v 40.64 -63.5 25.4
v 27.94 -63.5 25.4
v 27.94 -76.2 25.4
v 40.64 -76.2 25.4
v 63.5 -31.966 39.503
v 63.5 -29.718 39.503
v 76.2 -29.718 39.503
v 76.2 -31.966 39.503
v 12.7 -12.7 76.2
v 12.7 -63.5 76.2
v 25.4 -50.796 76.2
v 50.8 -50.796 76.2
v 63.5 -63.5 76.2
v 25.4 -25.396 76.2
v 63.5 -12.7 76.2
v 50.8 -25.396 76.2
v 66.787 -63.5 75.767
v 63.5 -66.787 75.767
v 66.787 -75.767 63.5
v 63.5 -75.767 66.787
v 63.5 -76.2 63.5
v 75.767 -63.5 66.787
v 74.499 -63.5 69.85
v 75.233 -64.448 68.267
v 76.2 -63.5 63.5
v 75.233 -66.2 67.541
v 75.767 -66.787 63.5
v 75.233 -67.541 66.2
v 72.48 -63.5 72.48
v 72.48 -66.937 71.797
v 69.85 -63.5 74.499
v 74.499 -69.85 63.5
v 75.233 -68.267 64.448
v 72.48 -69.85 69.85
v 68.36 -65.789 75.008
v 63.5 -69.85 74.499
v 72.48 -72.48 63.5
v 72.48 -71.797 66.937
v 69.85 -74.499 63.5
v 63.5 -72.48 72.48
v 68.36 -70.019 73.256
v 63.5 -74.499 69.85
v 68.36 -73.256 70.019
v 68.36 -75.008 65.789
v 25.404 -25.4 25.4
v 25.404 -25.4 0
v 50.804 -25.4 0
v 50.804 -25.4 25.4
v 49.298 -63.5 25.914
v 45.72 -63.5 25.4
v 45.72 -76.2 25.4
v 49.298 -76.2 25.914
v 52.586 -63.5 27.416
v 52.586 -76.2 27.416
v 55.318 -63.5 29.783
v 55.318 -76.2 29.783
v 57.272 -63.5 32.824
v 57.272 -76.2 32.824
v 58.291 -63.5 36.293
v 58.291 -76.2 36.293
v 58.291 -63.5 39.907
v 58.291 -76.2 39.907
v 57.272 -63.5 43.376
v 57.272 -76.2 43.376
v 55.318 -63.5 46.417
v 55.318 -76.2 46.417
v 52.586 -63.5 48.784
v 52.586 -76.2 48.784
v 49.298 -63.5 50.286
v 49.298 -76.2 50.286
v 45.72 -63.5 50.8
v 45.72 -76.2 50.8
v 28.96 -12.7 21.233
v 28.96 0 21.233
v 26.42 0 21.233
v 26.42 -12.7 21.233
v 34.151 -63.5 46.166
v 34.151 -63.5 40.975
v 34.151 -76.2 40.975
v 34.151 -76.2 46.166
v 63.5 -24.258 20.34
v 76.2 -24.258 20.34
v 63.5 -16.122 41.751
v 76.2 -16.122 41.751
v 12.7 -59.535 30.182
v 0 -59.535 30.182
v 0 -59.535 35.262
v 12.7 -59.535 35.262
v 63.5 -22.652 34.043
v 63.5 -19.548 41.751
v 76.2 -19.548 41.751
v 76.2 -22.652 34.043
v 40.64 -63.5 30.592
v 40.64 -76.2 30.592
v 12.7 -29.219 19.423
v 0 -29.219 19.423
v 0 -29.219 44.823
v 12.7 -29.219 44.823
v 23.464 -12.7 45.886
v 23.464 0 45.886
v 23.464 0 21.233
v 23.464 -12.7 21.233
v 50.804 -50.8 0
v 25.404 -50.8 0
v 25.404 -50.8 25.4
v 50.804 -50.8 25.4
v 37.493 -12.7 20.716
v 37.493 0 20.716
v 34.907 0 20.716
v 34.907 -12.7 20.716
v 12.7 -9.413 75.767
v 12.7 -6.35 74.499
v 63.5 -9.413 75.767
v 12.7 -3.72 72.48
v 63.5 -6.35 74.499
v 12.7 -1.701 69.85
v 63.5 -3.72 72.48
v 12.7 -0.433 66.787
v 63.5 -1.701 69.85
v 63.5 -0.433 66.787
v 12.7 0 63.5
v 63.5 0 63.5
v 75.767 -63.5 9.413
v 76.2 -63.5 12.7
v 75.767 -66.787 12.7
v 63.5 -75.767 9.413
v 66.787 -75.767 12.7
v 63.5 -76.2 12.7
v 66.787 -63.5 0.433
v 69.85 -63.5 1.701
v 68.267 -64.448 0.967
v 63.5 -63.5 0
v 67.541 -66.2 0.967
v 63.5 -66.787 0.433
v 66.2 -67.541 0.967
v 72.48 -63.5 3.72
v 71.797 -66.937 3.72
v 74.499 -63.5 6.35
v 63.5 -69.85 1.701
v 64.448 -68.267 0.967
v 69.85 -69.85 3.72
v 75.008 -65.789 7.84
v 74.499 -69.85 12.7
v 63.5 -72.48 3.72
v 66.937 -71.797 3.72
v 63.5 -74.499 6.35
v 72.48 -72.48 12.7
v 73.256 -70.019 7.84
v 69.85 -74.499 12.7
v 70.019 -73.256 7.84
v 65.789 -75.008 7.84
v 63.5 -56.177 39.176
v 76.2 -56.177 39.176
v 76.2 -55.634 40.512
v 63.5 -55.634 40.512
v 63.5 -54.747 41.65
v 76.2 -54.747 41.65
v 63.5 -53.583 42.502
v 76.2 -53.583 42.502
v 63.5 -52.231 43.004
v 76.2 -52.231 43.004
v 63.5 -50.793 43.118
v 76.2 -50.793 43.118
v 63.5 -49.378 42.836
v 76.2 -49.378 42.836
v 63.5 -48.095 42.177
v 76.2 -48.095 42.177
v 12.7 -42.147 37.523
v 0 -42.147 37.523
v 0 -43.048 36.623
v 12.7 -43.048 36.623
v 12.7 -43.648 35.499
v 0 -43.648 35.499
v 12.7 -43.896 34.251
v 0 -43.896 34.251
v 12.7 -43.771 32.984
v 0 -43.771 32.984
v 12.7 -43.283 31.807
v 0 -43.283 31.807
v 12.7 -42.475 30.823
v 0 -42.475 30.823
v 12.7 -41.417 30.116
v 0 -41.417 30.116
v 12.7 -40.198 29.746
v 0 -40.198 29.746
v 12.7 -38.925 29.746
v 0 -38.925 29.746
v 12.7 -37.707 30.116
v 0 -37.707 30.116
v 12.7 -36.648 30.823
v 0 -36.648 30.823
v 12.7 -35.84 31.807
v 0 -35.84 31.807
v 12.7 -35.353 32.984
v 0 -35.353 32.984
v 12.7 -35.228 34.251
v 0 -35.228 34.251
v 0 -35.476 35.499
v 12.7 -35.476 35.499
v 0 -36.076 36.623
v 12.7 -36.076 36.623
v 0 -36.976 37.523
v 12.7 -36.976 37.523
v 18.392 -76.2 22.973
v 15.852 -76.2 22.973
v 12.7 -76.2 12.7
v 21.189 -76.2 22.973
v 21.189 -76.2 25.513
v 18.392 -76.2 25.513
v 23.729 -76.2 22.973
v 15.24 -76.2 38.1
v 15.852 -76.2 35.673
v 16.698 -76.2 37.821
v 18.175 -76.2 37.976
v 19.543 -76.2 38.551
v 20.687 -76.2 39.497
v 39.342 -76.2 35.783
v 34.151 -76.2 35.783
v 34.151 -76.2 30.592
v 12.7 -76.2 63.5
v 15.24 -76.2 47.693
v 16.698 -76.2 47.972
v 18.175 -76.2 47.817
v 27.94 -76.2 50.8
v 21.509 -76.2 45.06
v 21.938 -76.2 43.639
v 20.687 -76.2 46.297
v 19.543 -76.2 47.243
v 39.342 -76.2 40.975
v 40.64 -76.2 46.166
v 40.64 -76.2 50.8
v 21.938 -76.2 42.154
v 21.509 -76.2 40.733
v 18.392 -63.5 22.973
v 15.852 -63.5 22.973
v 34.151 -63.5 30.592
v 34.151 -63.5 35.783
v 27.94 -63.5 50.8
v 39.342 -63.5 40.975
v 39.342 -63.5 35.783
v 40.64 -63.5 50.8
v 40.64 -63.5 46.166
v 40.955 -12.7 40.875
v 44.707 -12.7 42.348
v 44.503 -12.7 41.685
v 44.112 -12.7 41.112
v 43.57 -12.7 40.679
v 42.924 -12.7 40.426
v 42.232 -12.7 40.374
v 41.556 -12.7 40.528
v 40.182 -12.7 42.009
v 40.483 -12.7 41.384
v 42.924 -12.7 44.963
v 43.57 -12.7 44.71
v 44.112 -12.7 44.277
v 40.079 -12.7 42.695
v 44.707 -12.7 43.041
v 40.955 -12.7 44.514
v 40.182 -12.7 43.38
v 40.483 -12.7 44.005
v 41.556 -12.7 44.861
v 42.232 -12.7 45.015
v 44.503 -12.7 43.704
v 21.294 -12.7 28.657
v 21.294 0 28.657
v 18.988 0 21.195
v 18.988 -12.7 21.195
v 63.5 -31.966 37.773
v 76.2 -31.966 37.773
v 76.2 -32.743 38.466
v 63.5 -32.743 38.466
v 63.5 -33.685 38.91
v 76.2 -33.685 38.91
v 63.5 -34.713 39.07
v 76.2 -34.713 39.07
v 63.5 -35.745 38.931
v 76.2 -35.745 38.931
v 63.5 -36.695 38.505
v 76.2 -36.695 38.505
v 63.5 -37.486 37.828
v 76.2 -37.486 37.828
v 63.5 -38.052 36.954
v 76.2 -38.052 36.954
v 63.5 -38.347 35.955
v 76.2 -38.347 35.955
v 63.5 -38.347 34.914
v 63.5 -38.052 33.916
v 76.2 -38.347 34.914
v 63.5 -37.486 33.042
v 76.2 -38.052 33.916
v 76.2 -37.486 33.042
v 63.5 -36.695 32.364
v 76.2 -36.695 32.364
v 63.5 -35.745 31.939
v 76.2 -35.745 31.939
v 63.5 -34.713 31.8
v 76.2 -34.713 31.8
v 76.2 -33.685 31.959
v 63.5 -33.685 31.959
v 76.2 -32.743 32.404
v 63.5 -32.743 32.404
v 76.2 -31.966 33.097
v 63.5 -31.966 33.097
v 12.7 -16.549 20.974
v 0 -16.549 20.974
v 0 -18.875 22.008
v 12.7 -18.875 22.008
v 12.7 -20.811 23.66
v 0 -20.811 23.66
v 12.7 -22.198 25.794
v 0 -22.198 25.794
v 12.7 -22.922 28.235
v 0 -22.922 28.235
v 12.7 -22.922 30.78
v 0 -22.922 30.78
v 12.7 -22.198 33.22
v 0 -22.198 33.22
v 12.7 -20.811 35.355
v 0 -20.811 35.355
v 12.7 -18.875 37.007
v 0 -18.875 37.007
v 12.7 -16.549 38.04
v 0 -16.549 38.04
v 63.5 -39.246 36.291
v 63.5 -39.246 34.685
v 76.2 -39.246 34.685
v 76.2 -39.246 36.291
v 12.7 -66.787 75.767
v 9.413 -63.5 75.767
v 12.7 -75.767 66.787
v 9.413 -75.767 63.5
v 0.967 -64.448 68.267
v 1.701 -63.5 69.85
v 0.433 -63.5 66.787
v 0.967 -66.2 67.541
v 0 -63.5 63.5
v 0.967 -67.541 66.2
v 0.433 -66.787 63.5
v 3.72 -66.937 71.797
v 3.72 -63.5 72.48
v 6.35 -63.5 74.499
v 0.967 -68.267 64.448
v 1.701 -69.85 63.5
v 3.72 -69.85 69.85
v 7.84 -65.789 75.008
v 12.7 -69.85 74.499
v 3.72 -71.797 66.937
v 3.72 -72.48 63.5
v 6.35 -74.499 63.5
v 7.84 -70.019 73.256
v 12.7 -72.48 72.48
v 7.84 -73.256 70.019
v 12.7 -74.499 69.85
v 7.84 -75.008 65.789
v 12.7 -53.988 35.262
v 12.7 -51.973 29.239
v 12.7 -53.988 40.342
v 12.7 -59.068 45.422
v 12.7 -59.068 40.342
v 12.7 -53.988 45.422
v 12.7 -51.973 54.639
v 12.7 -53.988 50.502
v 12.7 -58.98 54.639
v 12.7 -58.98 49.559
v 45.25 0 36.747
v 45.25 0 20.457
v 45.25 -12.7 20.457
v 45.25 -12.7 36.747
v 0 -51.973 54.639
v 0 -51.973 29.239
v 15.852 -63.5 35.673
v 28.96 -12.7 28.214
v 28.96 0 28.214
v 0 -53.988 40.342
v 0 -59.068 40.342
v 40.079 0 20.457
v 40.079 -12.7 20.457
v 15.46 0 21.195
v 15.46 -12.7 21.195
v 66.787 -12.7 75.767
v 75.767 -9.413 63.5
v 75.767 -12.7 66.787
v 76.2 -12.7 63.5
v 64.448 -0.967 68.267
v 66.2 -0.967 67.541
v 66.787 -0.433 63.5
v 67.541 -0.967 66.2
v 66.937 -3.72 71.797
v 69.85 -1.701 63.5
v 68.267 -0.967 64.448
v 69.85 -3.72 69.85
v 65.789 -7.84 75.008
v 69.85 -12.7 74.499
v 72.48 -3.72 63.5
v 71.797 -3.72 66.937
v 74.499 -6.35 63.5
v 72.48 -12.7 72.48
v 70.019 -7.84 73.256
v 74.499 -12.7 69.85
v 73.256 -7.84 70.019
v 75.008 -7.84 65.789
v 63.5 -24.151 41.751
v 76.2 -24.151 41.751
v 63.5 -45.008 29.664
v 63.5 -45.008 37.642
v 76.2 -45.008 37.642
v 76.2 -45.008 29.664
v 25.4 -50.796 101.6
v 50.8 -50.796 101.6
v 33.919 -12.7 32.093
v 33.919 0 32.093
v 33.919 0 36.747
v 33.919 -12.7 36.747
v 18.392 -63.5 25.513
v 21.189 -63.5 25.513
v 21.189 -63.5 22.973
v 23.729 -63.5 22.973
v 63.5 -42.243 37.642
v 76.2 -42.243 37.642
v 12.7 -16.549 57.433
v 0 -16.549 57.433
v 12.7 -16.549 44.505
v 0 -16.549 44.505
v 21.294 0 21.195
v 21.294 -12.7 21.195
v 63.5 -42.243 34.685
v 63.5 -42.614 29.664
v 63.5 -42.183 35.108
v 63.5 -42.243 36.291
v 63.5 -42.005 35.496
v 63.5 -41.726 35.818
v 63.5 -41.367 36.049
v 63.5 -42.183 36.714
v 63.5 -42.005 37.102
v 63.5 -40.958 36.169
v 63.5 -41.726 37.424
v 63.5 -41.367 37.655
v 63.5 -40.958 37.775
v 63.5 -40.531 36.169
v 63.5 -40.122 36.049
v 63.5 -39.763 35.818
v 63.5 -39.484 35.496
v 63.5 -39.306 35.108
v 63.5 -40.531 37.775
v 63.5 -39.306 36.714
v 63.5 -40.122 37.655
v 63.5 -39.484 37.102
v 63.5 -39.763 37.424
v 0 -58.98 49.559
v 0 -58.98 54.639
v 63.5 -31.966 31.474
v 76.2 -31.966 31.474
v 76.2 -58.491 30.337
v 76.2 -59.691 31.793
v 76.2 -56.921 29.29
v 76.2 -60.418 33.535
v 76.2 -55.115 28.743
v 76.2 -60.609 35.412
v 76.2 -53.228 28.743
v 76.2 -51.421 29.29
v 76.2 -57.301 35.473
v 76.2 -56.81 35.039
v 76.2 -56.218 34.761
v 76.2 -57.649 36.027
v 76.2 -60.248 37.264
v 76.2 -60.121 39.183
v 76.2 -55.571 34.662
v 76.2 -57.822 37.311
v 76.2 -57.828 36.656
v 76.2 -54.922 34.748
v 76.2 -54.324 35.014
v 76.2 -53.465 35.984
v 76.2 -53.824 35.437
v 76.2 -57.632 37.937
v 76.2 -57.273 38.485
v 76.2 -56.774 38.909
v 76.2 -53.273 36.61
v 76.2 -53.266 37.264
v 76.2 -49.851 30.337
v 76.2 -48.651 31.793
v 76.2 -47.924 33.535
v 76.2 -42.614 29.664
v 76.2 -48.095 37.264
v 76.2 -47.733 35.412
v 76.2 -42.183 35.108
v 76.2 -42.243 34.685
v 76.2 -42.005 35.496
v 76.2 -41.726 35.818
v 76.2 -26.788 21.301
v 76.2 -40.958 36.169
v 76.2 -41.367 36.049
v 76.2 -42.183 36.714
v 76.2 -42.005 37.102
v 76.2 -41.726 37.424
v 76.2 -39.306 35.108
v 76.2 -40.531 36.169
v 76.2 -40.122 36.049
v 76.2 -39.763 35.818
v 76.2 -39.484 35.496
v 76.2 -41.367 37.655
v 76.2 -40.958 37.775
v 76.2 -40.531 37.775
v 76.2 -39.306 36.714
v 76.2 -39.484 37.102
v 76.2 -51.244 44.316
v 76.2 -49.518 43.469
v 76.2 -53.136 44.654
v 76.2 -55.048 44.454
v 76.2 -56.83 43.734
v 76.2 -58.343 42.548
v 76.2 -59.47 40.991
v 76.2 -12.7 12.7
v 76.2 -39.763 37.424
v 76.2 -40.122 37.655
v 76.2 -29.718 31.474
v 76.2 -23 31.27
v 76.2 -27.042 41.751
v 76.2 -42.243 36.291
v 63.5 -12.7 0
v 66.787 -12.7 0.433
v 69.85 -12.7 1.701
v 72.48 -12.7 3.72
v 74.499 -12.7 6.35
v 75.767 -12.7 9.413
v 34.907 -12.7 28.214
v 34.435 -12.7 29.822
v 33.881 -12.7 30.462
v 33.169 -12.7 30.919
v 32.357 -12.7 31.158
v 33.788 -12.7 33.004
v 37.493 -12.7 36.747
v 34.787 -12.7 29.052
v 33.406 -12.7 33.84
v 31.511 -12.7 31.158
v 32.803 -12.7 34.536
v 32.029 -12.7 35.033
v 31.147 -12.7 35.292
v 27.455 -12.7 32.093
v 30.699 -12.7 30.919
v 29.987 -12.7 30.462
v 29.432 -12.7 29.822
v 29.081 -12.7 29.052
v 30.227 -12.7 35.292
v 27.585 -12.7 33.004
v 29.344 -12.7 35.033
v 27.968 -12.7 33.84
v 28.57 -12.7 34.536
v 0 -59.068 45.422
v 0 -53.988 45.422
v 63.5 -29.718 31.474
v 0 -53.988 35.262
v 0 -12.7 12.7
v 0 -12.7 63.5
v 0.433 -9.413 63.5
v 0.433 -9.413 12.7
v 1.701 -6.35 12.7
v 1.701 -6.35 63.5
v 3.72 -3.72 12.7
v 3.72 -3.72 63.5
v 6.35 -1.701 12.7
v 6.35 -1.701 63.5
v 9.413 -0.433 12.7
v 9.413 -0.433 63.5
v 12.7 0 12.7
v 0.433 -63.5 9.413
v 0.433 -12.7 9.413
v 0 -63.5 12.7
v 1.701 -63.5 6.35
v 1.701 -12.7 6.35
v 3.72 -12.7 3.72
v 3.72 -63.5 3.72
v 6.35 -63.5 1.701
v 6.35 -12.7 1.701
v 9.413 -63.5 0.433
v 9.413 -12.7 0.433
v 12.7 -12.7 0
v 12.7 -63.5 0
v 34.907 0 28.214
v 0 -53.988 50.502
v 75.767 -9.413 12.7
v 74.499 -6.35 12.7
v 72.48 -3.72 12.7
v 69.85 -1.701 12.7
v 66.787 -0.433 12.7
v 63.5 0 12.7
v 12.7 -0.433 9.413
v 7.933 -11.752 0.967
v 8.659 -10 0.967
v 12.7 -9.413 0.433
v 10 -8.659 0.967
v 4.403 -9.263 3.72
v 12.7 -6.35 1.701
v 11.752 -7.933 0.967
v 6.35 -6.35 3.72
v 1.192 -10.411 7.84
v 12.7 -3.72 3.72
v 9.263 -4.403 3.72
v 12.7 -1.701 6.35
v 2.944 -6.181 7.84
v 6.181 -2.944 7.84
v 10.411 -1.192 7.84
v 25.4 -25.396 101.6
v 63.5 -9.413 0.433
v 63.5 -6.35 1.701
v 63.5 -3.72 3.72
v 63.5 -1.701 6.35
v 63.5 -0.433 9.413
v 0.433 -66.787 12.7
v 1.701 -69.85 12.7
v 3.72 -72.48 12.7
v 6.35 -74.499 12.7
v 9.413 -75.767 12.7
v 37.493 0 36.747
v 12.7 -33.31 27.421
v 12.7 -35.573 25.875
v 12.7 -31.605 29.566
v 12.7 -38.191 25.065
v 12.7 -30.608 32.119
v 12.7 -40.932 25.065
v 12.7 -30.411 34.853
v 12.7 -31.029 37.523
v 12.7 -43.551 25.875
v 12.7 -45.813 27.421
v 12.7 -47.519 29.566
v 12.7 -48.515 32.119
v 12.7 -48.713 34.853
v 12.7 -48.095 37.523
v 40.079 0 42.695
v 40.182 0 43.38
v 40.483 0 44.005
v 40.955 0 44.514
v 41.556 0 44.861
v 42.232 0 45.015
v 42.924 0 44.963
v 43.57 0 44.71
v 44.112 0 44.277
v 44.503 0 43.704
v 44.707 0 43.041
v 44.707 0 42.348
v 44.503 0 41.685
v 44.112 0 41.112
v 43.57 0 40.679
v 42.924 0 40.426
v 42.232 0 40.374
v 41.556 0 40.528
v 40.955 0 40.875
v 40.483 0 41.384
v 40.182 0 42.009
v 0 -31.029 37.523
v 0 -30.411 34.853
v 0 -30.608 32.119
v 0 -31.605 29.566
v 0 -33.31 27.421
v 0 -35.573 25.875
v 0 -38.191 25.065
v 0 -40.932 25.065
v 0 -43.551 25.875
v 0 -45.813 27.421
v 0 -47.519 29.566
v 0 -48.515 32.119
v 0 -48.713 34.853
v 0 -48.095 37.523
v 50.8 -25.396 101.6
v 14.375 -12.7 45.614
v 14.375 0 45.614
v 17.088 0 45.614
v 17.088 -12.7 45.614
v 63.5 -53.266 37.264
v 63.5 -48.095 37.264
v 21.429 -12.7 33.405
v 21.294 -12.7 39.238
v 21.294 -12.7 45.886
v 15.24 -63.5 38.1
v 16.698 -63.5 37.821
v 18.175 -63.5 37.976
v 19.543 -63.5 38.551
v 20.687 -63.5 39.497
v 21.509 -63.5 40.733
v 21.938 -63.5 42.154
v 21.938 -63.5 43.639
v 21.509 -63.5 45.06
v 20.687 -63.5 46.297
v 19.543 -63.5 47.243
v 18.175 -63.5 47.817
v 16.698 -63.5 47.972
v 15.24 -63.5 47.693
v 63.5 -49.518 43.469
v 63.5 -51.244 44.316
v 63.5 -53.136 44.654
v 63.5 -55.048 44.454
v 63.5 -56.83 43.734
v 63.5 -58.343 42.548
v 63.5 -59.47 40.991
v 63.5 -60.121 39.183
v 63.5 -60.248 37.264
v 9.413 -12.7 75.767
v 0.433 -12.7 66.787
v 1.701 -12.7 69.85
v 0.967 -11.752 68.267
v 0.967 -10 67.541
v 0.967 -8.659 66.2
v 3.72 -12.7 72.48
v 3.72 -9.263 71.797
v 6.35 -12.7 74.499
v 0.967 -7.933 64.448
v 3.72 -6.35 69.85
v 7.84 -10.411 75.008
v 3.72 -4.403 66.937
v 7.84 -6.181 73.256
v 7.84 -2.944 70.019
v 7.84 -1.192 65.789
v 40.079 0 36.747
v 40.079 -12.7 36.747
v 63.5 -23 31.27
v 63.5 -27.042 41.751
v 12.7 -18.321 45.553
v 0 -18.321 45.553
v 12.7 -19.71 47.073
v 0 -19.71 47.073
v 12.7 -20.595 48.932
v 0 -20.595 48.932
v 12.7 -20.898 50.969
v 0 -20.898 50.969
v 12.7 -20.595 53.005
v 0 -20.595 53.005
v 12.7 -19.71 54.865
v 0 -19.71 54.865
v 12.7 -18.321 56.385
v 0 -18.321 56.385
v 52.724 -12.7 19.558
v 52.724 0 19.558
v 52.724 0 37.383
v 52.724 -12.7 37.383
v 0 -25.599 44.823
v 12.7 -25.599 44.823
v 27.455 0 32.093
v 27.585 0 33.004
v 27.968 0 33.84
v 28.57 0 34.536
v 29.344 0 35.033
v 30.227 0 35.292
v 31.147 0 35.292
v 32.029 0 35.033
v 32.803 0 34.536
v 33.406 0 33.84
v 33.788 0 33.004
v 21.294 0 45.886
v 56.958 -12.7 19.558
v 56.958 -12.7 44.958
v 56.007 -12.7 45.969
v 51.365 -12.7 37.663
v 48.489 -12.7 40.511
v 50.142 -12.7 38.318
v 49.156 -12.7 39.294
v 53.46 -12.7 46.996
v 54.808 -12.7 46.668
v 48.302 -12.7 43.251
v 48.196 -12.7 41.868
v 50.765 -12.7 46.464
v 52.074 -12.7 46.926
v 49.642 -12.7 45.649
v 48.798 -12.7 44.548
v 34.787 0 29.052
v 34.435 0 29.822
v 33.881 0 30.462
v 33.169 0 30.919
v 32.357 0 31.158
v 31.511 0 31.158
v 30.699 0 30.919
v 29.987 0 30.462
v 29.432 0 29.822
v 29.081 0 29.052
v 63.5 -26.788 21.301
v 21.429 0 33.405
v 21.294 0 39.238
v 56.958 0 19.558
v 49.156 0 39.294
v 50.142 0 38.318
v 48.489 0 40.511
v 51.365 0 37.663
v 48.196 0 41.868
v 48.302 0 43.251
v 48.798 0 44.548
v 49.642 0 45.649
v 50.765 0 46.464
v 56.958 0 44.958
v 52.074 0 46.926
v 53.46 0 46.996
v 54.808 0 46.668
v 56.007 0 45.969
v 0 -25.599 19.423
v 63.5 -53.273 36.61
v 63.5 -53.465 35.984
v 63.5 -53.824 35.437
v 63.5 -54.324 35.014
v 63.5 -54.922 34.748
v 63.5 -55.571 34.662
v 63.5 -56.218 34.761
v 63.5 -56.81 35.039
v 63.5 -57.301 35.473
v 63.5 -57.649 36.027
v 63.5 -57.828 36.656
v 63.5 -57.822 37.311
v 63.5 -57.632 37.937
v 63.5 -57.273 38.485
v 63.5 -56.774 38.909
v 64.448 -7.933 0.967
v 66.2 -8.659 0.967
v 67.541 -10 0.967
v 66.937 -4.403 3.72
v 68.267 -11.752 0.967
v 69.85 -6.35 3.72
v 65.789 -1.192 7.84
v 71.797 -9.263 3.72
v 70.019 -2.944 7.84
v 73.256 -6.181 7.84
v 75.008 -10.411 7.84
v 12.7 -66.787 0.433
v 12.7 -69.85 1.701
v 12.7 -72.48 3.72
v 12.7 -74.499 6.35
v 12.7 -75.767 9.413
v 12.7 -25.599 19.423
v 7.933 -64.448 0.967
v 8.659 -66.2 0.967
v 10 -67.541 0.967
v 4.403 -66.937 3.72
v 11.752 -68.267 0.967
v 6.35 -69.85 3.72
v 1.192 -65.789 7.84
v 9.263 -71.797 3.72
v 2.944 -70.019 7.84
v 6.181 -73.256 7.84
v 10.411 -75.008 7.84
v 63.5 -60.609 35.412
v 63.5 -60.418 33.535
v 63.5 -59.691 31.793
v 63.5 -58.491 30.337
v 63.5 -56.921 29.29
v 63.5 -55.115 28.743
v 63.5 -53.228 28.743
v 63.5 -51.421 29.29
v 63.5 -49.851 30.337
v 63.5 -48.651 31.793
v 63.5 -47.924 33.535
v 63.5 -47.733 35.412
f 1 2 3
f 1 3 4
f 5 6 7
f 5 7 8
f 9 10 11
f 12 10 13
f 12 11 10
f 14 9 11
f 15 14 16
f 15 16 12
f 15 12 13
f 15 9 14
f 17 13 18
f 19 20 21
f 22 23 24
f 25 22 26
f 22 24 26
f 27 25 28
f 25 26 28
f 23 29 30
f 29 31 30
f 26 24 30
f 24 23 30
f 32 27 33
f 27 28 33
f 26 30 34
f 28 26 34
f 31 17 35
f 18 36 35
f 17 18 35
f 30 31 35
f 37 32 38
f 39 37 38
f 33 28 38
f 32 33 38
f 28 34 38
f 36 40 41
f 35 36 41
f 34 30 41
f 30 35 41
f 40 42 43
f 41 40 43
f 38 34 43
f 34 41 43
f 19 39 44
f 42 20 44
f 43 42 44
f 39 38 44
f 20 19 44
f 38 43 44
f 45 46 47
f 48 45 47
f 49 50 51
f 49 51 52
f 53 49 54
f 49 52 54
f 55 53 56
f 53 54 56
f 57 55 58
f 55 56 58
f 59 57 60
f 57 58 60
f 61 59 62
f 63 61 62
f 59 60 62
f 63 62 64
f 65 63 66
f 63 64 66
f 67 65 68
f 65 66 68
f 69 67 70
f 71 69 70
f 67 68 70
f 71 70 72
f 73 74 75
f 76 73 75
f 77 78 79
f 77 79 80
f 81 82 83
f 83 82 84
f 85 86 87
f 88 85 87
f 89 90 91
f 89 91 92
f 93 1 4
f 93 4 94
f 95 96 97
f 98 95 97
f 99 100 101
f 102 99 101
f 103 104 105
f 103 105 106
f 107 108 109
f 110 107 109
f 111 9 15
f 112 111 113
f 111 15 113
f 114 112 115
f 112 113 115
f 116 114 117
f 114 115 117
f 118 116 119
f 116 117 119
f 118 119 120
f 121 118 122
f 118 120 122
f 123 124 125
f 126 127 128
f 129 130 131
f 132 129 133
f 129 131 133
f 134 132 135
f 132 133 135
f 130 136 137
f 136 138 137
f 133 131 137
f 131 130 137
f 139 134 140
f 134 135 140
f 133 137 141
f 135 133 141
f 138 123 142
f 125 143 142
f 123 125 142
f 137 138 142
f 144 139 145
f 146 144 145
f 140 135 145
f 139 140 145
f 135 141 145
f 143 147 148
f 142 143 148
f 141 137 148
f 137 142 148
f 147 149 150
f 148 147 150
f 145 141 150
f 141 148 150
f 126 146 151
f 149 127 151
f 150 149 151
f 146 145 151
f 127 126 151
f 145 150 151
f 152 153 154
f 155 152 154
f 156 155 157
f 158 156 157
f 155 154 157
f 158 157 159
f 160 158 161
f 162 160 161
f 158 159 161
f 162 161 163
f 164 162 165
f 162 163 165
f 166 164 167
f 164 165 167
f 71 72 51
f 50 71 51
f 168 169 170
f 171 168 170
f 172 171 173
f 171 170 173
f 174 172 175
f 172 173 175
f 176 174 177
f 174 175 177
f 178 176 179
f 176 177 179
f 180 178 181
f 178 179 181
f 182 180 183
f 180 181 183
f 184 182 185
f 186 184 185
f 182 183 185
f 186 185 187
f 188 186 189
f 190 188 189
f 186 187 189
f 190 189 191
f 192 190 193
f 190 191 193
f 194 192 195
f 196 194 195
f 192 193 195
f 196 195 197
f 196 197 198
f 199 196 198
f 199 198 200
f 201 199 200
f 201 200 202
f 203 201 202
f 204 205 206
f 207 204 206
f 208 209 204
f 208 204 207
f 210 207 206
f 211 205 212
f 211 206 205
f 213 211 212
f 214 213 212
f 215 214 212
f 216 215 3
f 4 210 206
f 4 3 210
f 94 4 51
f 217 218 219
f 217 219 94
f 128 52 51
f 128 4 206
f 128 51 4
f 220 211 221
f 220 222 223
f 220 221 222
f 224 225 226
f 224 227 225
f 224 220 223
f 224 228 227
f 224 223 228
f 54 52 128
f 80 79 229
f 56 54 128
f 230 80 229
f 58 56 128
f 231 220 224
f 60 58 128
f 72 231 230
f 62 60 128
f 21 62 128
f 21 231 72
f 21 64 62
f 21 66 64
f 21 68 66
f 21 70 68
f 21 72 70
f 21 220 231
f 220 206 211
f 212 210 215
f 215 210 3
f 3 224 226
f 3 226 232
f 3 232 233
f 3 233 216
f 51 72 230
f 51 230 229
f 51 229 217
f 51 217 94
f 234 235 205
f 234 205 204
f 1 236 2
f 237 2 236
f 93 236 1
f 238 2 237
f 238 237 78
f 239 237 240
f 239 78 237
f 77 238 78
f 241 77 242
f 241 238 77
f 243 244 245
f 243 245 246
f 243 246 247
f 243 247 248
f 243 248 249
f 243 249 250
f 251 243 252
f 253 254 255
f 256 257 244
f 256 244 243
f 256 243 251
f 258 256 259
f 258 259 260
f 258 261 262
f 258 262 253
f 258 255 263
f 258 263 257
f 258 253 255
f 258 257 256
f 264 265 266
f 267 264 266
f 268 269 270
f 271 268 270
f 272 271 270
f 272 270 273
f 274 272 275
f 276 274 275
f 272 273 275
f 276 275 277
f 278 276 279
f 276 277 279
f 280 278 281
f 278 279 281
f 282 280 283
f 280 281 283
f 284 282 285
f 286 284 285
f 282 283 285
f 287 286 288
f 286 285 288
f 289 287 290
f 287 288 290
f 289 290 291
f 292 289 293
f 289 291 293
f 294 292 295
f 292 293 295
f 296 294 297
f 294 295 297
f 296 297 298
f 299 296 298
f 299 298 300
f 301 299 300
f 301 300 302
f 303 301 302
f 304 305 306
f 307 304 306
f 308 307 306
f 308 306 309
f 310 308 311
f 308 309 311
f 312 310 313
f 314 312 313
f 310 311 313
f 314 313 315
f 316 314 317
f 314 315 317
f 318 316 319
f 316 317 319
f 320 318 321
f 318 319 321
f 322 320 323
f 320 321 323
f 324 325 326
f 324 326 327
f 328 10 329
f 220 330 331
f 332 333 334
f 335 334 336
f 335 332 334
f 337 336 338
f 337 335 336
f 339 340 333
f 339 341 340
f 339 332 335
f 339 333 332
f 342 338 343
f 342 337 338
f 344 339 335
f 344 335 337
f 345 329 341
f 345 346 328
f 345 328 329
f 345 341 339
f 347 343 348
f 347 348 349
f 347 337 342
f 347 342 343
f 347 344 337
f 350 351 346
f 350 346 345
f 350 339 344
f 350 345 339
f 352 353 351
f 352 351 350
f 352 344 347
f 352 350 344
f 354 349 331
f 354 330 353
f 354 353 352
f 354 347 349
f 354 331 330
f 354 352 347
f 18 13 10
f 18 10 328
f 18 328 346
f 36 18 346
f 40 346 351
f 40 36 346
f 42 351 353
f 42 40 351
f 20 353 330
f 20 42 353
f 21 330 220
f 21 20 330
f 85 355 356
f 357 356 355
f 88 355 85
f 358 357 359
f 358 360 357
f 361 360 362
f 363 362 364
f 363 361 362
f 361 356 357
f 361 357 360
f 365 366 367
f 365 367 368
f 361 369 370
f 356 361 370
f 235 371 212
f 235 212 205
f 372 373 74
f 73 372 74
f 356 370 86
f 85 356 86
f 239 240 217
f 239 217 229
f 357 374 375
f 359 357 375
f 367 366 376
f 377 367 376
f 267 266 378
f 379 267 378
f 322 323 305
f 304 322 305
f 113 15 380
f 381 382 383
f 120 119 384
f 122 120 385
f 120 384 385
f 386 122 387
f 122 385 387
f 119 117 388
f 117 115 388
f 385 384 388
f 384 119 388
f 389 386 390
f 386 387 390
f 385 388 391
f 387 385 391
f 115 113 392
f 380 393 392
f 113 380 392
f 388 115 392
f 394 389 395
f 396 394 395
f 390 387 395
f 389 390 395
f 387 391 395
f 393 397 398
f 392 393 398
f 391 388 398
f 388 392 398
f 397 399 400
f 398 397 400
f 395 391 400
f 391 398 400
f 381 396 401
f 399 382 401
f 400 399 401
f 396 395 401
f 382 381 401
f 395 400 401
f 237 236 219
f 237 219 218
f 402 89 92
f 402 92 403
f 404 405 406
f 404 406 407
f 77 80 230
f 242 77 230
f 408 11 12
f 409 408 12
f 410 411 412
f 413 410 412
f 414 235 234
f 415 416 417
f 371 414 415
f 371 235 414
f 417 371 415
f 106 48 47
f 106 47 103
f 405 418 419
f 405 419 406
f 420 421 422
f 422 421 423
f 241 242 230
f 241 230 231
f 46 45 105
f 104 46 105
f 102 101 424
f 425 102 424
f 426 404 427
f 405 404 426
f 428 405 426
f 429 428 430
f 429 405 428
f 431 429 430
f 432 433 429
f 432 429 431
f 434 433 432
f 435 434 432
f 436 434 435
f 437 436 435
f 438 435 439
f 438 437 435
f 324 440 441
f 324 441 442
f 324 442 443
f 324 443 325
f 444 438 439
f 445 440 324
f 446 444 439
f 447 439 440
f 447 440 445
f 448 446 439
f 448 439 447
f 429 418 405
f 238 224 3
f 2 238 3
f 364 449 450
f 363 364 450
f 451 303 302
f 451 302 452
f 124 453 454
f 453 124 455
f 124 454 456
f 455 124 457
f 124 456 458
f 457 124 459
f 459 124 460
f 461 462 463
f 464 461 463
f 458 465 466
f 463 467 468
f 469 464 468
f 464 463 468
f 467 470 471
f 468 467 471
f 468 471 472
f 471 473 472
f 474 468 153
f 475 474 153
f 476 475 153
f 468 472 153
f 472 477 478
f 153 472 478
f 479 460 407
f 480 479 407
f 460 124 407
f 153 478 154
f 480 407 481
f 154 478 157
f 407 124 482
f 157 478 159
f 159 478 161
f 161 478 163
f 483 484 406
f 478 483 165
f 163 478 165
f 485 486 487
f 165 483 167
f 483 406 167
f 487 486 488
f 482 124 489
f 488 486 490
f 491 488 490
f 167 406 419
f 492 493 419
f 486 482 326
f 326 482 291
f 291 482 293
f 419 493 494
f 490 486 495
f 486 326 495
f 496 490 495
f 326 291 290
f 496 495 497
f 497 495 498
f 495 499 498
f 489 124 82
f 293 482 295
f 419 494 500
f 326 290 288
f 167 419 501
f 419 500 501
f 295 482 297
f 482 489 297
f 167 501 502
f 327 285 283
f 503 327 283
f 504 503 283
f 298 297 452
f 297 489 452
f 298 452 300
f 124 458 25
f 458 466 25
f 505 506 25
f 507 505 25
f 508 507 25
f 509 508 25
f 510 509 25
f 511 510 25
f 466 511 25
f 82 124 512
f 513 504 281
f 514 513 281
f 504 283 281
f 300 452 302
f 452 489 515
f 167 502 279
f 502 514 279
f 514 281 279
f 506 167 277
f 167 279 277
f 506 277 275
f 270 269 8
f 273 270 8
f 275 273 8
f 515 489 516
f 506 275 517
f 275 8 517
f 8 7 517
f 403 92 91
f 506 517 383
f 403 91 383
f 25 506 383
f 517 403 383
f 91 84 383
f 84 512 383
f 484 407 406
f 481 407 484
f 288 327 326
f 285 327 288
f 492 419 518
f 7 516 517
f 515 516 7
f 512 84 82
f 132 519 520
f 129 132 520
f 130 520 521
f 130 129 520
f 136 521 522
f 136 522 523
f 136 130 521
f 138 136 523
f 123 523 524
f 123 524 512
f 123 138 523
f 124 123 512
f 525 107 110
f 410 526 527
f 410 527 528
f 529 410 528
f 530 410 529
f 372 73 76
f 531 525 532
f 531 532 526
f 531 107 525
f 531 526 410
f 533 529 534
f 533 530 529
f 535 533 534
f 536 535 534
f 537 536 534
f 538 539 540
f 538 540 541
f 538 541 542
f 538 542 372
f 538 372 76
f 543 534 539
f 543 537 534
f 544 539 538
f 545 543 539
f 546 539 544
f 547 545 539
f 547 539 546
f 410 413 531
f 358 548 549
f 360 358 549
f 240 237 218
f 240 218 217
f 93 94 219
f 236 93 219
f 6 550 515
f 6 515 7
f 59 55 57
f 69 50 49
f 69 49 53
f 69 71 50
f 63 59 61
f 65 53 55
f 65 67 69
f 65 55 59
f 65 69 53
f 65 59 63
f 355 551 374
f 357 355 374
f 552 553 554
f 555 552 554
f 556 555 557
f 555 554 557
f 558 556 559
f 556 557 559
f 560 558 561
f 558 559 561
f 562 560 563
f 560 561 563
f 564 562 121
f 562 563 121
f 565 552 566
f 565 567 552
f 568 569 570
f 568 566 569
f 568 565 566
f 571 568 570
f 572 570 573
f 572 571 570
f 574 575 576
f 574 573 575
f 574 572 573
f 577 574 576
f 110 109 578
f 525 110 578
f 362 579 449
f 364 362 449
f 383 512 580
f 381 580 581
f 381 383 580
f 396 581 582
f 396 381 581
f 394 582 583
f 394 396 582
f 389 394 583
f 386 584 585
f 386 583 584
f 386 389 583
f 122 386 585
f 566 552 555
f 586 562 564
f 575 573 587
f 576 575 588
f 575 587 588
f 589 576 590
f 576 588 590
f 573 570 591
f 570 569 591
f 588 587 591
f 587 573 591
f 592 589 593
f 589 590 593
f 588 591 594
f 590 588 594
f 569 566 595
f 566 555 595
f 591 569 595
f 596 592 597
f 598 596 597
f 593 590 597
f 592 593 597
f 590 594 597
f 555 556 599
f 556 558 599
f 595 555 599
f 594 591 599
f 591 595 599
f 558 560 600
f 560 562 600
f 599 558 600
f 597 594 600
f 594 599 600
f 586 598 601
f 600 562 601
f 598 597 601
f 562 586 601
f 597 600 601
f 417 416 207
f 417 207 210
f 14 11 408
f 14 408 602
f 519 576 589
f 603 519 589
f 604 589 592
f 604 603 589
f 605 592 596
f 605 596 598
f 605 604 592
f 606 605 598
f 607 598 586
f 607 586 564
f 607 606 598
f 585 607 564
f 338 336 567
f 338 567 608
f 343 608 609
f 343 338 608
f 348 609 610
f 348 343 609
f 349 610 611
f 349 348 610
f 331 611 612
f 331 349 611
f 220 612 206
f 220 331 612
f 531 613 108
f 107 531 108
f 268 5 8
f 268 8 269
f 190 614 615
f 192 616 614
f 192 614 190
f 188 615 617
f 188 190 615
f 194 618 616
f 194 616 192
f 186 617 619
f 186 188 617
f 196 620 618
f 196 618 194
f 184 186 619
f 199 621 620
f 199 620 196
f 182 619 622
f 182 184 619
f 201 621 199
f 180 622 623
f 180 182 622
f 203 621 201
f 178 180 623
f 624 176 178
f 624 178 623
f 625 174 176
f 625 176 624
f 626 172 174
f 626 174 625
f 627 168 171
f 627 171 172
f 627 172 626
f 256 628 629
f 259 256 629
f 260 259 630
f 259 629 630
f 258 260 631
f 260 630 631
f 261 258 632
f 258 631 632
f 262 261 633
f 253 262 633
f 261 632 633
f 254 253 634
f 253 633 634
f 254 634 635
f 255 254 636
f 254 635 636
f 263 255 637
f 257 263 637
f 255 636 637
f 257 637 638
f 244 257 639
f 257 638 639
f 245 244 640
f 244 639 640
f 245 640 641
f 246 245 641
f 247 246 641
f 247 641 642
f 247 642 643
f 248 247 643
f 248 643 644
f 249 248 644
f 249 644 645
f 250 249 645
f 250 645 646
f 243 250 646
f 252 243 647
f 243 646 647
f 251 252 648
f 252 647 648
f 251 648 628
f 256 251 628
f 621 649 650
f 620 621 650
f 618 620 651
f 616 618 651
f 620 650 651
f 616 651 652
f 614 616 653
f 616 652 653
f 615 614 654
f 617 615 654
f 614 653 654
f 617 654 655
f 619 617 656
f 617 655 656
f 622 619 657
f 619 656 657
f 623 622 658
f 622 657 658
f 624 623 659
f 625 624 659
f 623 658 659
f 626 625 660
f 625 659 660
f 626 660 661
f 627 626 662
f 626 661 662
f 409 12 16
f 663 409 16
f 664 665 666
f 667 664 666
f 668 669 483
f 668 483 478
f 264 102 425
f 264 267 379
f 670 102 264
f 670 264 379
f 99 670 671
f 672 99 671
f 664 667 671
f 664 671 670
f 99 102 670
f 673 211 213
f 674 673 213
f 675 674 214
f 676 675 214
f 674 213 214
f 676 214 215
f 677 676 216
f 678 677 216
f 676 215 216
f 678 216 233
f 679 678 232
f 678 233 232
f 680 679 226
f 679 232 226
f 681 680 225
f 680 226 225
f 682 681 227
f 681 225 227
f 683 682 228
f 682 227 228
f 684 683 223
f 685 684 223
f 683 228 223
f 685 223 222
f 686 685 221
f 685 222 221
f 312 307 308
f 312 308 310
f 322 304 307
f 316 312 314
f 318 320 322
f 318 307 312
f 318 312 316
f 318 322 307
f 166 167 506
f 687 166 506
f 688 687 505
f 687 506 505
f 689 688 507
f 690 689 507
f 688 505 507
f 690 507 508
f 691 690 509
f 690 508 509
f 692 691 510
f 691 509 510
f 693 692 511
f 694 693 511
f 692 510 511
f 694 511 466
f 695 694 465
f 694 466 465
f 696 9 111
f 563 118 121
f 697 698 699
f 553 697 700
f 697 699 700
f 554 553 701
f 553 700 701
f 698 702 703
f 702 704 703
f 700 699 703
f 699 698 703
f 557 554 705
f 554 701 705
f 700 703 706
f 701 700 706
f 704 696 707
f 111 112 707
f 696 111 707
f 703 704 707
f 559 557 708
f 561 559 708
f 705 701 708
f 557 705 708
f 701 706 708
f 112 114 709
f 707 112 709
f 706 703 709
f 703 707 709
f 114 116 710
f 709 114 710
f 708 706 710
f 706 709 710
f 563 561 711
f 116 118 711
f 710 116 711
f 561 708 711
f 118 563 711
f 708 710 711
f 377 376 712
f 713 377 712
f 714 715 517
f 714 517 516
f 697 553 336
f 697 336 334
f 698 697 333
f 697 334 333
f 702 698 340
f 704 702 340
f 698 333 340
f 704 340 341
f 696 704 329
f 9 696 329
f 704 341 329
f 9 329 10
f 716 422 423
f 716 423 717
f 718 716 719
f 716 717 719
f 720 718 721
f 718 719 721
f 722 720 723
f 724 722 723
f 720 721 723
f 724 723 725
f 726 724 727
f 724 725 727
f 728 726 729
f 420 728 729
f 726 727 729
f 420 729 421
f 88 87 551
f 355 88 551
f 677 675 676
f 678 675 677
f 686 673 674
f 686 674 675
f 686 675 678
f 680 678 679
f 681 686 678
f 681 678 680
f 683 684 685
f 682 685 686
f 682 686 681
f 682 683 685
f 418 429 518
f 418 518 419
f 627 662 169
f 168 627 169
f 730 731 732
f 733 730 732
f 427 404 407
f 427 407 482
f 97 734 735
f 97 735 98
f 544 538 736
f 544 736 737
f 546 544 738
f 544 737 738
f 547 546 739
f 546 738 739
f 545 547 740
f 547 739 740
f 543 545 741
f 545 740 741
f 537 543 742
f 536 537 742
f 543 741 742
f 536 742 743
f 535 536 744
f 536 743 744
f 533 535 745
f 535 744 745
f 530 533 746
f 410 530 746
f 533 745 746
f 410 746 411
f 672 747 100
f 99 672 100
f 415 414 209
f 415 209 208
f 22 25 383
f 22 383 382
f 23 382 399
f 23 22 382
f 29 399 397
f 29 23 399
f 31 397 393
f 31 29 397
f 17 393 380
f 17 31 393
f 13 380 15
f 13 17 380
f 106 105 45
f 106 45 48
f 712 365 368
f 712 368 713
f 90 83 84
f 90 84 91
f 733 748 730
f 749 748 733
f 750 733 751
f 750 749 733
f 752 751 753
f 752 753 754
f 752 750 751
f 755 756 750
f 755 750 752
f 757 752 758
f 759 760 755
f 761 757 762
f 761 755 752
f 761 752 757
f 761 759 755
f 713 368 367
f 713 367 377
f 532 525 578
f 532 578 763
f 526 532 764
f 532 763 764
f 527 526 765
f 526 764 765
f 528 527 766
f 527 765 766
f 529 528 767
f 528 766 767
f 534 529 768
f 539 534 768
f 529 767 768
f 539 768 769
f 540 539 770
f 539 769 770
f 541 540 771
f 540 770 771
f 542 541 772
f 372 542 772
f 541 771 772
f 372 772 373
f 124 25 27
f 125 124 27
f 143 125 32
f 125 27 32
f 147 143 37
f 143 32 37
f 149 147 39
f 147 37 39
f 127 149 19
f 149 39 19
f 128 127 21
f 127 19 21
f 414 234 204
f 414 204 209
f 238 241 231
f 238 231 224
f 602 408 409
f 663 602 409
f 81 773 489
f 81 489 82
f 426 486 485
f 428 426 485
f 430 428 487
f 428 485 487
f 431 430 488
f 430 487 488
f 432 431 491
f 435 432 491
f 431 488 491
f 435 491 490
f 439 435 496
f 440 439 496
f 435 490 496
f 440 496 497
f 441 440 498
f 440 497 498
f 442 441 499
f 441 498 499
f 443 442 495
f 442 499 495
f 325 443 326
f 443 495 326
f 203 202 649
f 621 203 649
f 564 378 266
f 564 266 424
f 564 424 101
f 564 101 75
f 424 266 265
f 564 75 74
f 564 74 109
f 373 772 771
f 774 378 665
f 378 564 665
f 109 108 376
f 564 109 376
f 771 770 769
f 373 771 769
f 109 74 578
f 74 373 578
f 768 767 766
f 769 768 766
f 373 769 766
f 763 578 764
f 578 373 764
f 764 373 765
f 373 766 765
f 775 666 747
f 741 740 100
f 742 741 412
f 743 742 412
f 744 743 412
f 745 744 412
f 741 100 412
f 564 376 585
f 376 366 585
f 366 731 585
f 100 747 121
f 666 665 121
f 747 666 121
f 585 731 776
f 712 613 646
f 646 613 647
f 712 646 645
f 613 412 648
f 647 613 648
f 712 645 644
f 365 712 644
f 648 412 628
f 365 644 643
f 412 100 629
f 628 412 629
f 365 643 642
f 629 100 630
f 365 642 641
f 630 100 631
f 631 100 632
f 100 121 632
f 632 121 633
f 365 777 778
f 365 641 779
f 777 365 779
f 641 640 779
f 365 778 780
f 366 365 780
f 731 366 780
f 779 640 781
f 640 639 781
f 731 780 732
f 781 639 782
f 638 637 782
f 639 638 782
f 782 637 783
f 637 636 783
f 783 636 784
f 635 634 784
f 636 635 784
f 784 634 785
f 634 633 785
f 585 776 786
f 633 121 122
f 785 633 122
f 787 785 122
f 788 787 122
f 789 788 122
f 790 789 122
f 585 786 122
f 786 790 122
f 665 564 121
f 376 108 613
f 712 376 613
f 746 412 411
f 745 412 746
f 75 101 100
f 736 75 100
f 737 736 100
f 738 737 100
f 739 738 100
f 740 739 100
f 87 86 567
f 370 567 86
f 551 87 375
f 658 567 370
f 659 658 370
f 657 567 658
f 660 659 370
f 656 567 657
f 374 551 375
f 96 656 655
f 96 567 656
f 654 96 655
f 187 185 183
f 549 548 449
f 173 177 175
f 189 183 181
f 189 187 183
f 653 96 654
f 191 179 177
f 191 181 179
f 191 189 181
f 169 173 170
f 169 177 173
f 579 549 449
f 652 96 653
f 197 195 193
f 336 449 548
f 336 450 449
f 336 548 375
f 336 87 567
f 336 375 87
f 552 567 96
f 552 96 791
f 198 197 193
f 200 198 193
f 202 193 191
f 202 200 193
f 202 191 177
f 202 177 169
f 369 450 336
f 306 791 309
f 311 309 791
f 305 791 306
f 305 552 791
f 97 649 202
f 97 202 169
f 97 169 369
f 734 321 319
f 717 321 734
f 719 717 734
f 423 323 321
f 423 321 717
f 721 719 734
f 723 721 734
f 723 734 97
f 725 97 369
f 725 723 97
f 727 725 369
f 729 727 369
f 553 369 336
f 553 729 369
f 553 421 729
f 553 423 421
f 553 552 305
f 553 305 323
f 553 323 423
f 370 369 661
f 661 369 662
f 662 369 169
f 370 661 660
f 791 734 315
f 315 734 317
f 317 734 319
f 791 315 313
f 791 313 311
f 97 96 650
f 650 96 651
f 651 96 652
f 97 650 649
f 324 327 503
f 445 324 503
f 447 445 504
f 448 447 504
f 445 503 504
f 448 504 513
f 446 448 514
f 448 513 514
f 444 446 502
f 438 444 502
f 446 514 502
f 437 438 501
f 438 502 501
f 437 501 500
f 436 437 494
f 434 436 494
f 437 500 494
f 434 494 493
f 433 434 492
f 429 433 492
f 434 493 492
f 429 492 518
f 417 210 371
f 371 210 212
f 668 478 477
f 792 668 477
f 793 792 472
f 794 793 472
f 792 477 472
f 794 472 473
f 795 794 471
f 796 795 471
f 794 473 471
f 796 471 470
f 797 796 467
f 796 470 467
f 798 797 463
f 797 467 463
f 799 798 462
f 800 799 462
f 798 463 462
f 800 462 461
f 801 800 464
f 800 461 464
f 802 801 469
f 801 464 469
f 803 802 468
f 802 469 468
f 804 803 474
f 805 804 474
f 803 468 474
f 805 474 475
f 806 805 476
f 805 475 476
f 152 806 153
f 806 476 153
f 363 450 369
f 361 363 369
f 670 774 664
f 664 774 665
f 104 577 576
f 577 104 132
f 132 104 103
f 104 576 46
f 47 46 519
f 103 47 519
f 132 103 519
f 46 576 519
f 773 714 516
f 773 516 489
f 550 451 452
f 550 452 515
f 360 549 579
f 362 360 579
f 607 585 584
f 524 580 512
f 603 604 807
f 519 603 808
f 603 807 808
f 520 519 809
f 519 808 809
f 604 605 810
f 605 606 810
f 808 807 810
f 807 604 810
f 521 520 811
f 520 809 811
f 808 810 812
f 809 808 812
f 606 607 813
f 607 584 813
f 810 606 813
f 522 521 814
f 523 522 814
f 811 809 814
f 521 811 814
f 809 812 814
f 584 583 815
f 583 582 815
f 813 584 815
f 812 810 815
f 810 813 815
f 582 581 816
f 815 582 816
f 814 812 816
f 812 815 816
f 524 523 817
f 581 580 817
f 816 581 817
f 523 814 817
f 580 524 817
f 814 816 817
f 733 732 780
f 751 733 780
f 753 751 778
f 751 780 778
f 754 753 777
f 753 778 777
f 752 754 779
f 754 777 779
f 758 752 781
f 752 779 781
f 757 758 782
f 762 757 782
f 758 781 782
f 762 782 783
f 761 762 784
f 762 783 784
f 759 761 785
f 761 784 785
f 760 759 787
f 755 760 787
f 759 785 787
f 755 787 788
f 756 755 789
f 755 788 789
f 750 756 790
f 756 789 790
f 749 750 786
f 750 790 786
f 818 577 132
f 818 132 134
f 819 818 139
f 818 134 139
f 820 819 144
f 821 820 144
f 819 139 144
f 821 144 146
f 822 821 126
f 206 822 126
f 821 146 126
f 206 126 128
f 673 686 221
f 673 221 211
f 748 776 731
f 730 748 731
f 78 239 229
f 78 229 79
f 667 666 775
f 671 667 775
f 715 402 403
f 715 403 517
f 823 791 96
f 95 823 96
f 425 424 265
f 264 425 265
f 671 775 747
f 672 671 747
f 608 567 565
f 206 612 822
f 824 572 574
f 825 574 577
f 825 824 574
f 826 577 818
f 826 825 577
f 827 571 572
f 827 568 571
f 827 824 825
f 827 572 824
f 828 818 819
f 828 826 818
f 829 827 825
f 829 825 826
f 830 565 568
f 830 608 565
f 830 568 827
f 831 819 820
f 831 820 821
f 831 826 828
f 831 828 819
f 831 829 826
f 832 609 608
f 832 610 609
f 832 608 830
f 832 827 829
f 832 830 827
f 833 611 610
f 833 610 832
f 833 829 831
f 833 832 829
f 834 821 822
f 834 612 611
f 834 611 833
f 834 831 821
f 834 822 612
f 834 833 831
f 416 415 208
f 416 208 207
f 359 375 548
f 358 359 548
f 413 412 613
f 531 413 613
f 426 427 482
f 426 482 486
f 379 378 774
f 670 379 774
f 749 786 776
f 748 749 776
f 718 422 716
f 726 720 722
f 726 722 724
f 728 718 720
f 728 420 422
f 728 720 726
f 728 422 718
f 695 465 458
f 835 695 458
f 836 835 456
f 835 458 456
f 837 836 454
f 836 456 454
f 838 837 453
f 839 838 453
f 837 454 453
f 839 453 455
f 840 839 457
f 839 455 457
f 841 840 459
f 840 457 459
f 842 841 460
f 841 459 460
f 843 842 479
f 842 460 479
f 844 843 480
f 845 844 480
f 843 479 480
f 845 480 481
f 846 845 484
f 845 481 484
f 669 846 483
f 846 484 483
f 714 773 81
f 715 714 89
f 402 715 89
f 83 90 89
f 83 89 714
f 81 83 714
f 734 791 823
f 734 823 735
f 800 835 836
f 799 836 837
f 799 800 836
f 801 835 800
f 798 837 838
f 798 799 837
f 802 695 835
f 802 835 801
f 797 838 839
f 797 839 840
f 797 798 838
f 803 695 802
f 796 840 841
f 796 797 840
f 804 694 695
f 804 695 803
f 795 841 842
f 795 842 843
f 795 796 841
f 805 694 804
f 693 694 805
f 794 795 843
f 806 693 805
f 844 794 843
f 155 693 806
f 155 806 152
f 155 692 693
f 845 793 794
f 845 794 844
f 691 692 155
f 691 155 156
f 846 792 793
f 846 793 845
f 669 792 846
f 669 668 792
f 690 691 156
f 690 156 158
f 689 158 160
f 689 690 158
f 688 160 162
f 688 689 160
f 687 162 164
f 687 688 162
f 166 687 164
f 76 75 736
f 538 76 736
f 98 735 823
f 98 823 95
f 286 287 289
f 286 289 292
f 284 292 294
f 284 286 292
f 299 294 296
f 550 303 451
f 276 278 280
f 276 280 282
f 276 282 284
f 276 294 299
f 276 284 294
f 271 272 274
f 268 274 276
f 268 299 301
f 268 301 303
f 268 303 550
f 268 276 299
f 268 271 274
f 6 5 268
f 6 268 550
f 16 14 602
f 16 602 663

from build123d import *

# Parameters (mm, degrees)
F0_W      = 76.2
F0_H      = 76.2
F1_DEPTH  = 76.2
F2_R      = 12.7
F4_DEPTH  = 12.7
F6_DEPTH  = 12.7
F7_W      = 25.4
F7_H      = 25.4
F8_DEPTH  = 25.4
F9_W      = 25.4
F9_H      = 25.4
F10_DEPTH = 25.4
F11_W     = 3.6200266331
F11_H     = 25.4
F12_DEPTH = 12.7
F13_W     = 5.1714666188
F13_H     = 16.2901245058
F13_R     = 2.3271590471
F14_DEPTH = 12.7
F16_DEPTH = 12.7


with BuildPart() as f1:
    # F0 (on Front) → F1 (new body)
    with BuildSketch(Plane.XZ):
        with Locations((38.1, 38.1)):
            Rectangle(F0_W, F0_H)
    extrude(amount=F1_DEPTH)

    # F2
    f2_edges = [f1.edges().sort_by_distance(p)[0] for p in [
        (38.1, -76.2, 76.2),
        (76.2, -38.1, 76.2),
        (38.1, 0, 76.2),
        (0, -38.1, 76.2),
        (76.2, -76.2, 38.1),
        (76.2, 0, 38.1),
        (0, -76.2, 38.1),
        (0, 0, 38.1),
        (0, -38.1, 0),
        (38.1, 0, 0),
        (76.2, -38.1, 0),
        (38.1, -76.2, 0),
    ]]
    fillet(f2_edges, radius=F2_R)

    # F3 (on face) → F4 (cut)
    with BuildSketch(Plane.XZ.offset(76.2)):
        with BuildLine():
            Line((15.24, 47.6933766934), (15.24, 38.1))
            ThreePointArc((15.24, 38.1), (21.992776406, 42.8966883467), (15.24, 47.6933766934))
        make_face()
        Polygon((27.94, 50.8), (27.94, 25.4), (40.64, 25.4), (40.64, 30.5915938972), (34.1505076285, 30.5915938972), (34.1505076285, 35.7831877943), (39.3421015257, 35.7831877943), (39.3421015257, 40.9747816915), (34.1505076285, 40.9747816915), (34.1505076285, 46.1663755887), (40.64, 46.1663755887), (40.64, 50.8), align=None)
        with BuildLine():
            ThreePointArc((45.72, 25.4), (58.42, 38.1), (45.72, 50.8))
            Line((45.72, 50.8), (45.72, 25.4))
        make_face()
    extrude(amount=-F4_DEPTH, mode=Mode.SUBTRACT)

    # F5 (on face) → F6 (cut)
    with BuildSketch(Plane.XZ.offset(76.2)):
        Polygon((23.7294812034, 22.97295762), (15.8522693162, 35.67295762), (15.8522693162, 22.97295762), (18.3922693162, 22.97295762), (18.3922693162, 25.51295762), (21.1894812034, 25.51295762), (21.1894812034, 22.97295762), align=None)
    extrude(amount=-F6_DEPTH, mode=Mode.SUBTRACT)

    # F7 (on face) → F8 (cut)
    with BuildSketch(Plane(origin=(0, 0, 0), x_dir=(1, 0, 0), z_dir=(0, 0, -1))):
        with Locations((38.1038359793, 38.1)):
            Rectangle(F7_W, F7_H)
    extrude(amount=-F8_DEPTH, mode=Mode.SUBTRACT)

    # F9 (on face) → F10 (join)
    with BuildSketch(Plane.XY.offset(76.2)):
        with Locations((38.1, -38.0961640207)):
            Rectangle(F9_W, F9_H)
    extrude(amount=F10_DEPTH)

    # F11 (on face) → F12 (cut)
    with BuildSketch(Plane(origin=(0, 0, 0), x_dir=(0, -1, 0), z_dir=(-1, 0, 0))):
        with BuildLine():
            ThreePointArc((16.548698768, 44.5045307279), (20.8982916063, 50.9688649327), (16.548698768, 57.4331991374))
            Line((16.548698768, 57.4331991374), (16.548698768, 44.5045307279))
        make_face()
        with BuildLine():
            ThreePointArc((16.548698768, 20.9743473679), (23.013450923, 29.5072691515), (16.548698768, 38.0401909351))
            Line((16.548698768, 38.0401909351), (16.548698768, 20.9743473679))
        make_face()
        with Locations((27.4087795988, 32.1229073822)):
            Rectangle(F11_W, F11_H)
        with BuildLine():
            Line((36.9759984314, 37.5230461359), (31.0288090259, 37.5230461359))
            ThreePointArc((31.0288090259, 37.5230461359), (39.5617289469, 24.9625075374), (48.0946488678, 37.5230461359))
            Line((48.0946488678, 37.5230461359), (42.1474650502, 37.5230461359))
            ThreePointArc((42.1474650502, 37.5230461359), (39.5617317408, 29.699298714), (36.9759984314, 37.5230461359))
        make_face()
        Polygon((51.9732572138, 54.6391973982), (51.9732572138, 29.2391973982), (59.5346949809, 30.1820965947), (59.5346949809, 35.2620965947), (53.9881583642, 35.2620965947), (53.9881583642, 40.3420965947), (59.0681583642, 40.3420965947), (59.0681583642, 45.4220965947), (53.9881583642, 45.4220965947), (53.9881583642, 50.5020965947), (58.9798856309, 49.5591973982), (58.9798856309, 54.6391973982), align=None)
    extrude(amount=-F12_DEPTH, mode=Mode.SUBTRACT)

    # F13 (on face) → F14 (cut)
    with BuildSketch(Plane(origin=(0, 0, 0), x_dir=(-1, 0, 0), z_dir=(0, 1, 0))):
        with BuildLine():
            ThreePointArc((-52.724421297, 37.3828077149), (-48.797749492, 44.5476863023), (-56.9577540953, 44.958248733))
            Line((-56.9577540953, 44.958248733), (-56.9577540953, 19.558248733))
            Line((-56.9577540953, 19.558248733), (-52.724421297, 19.558248733))
            Line((-52.724421297, 19.558248733), (-52.724421297, 37.3828077149))
        make_face()
        with Locations((-42.6646117121, 28.6022629589)):
            Rectangle(F13_W, F13_H)
        with BuildLine():
            Line((-37.4931432307, 36.7473252118), (-37.4931432307, 20.7157749683))
            Line((-37.4931432307, 20.7157749683), (-34.9074080586, 20.7157749683))
            Line((-34.9074080586, 20.7157749683), (-34.9074080586, 28.2144043595))
            ThreePointArc((-34.9074080586, 28.2144043595), (-31.9338152185, 31.1879971996), (-28.9602223784, 28.2144043595))
            Line((-28.9602223784, 28.2144043595), (-28.9602223784, 21.2329216301))
            Line((-28.9602223784, 21.2329216301), (-26.4202223784, 21.2329216301))
            Line((-26.4202223784, 21.2329216301), (-27.4545157021, 32.0930033922))
            ThreePointArc((-27.4545157021, 32.0930033922), (-30.6866828045, 35.3251704946), (-33.9188499069, 32.0930033922))
            Line((-33.9188499069, 32.0930033922), (-33.9188499069, 36.7473252118))
            Line((-33.9188499069, 36.7473252118), (-37.4931432307, 36.7473252118))
        make_face()
        Polygon((-23.4643667936, 45.8856336772), (-23.4643667936, 21.2329216301), (-21.2937723845, 21.1951211095), (-21.2937723845, 28.6565385759), (-18.9875140786, 21.1951211095), (-15.4602974653, 21.1951211095), (-21.4294362813, 33.4047153592), (-14.3750030547, 45.6143096089), (-17.0882474631, 45.6143096089), (-21.2937723845, 39.2381884158), (-21.2937723845, 45.8856336772), align=None)
        with Locations((-42.4060374498, 42.69451648)):
            Circle(F13_R)
    extrude(amount=-F14_DEPTH, mode=Mode.SUBTRACT)

    # F15 (on face) → F16 (cut)
    with BuildSketch(Plane.YZ.offset(76.2)):
        with BuildLine():
            Line((-48.0946525931, 37.2644737363), (-53.2661229372, 37.2644737363))
            ThreePointArc((-53.2661229372, 37.2644737363), (-56.8104432824, 35.0391216214), (-56.1766475439, 39.1758717597))
            ThreePointArc((-56.1766475439, 39.1758717597), (-52.9242890713, 42.80015293), (-48.0946525931, 42.1773679554))
            ThreePointArc((-48.0946525931, 42.1773679554), (-55.964214699, 44.1564514691), (-60.2476038039, 37.2644737363))
            ThreePointArc((-60.2476038039, 37.2644737363), (-54.1711281985, 28.6739696125), (-48.0946525931, 37.2644737363))
        make_face()
        with BuildLine():
            Line((-45.0075529516, 37.6416556537), (-45.0075529516, 29.6637304127))
            Line((-45.0075529516, 29.6637304127), (-42.6141768694, 29.6637304127))
            Line((-42.6141768694, 29.6637304127), (-42.2433055937, 34.6854478121))
            ThreePointArc((-42.2433055937, 34.6854478121), (-40.744535625, 36.1842177808), (-39.2457656562, 34.6854478121))
            Line((-39.2457656562, 34.6854478121), (-39.2457656562, 36.2912714481))
            ThreePointArc((-39.2457656562, 36.2912714481), (-40.744535625, 37.7900414169), (-42.2433055937, 36.2912714481))
            Line((-42.2433055937, 36.2912714481), (-42.2433055937, 37.6416556537))
            Line((-42.2433055937, 37.6416556537), (-45.0075529516, 37.6416556537))
        make_face()
        with BuildLine():
            ThreePointArc((-31.9660305977, 33.0967174506), (-31.3338769664, 34.1906255239), (-31.1143183532, 35.4348309338))
            ThreePointArc((-31.1143183532, 35.4348309338), (-31.3338769664, 36.6790363437), (-31.9660305977, 37.772944417))
            Line((-31.9660305977, 37.772944417), (-31.9660305977, 33.0967174506))
        make_face()
        with BuildLine():
            ThreePointArc((-31.9660305977, 37.772944417), (-31.3338769664, 36.6790363437), (-31.1143183532, 35.4348309338))
            ThreePointArc((-31.1143183532, 35.4348309338), (-31.3338769664, 34.1906255239), (-31.9660305977, 33.0967174506))
            Line((-31.9660305977, 33.0967174506), (-31.9660305977, 31.4737968147))
            Line((-31.9660305977, 31.4737968147), (-29.7178756446, 31.4737968147))
            Line((-29.7178756446, 31.4737968147), (-29.7178756446, 39.5029187202))
            Line((-29.7178756446, 39.5029187202), (-31.9660305977, 39.5029187202))
            Line((-31.9660305977, 39.5029187202), (-31.9660305977, 37.772944417))
        make_face()
        with BuildLine():
            Line((-31.9660305977, 33.0967174506), (-31.9660305977, 37.772944417))
            ThreePointArc((-31.9660305977, 37.772944417), (-38.3846005973, 35.4348309338), (-31.9660305977, 33.0967174506))
        make_face()
        Polygon((-24.1510178894, 41.751075536), (-27.0415022969, 41.751075536), (-22.9996046927, 31.2696424589), (-26.7875780846, 21.3012932532), (-24.2580734193, 20.3400813043), (-16.1218941212, 41.751075536), (-19.5476543158, 41.751075536), (-22.6522479206, 34.0431183577), align=None)
    extrude(amount=-F16_DEPTH, mode=Mode.SUBTRACT)


solid = f1.part
